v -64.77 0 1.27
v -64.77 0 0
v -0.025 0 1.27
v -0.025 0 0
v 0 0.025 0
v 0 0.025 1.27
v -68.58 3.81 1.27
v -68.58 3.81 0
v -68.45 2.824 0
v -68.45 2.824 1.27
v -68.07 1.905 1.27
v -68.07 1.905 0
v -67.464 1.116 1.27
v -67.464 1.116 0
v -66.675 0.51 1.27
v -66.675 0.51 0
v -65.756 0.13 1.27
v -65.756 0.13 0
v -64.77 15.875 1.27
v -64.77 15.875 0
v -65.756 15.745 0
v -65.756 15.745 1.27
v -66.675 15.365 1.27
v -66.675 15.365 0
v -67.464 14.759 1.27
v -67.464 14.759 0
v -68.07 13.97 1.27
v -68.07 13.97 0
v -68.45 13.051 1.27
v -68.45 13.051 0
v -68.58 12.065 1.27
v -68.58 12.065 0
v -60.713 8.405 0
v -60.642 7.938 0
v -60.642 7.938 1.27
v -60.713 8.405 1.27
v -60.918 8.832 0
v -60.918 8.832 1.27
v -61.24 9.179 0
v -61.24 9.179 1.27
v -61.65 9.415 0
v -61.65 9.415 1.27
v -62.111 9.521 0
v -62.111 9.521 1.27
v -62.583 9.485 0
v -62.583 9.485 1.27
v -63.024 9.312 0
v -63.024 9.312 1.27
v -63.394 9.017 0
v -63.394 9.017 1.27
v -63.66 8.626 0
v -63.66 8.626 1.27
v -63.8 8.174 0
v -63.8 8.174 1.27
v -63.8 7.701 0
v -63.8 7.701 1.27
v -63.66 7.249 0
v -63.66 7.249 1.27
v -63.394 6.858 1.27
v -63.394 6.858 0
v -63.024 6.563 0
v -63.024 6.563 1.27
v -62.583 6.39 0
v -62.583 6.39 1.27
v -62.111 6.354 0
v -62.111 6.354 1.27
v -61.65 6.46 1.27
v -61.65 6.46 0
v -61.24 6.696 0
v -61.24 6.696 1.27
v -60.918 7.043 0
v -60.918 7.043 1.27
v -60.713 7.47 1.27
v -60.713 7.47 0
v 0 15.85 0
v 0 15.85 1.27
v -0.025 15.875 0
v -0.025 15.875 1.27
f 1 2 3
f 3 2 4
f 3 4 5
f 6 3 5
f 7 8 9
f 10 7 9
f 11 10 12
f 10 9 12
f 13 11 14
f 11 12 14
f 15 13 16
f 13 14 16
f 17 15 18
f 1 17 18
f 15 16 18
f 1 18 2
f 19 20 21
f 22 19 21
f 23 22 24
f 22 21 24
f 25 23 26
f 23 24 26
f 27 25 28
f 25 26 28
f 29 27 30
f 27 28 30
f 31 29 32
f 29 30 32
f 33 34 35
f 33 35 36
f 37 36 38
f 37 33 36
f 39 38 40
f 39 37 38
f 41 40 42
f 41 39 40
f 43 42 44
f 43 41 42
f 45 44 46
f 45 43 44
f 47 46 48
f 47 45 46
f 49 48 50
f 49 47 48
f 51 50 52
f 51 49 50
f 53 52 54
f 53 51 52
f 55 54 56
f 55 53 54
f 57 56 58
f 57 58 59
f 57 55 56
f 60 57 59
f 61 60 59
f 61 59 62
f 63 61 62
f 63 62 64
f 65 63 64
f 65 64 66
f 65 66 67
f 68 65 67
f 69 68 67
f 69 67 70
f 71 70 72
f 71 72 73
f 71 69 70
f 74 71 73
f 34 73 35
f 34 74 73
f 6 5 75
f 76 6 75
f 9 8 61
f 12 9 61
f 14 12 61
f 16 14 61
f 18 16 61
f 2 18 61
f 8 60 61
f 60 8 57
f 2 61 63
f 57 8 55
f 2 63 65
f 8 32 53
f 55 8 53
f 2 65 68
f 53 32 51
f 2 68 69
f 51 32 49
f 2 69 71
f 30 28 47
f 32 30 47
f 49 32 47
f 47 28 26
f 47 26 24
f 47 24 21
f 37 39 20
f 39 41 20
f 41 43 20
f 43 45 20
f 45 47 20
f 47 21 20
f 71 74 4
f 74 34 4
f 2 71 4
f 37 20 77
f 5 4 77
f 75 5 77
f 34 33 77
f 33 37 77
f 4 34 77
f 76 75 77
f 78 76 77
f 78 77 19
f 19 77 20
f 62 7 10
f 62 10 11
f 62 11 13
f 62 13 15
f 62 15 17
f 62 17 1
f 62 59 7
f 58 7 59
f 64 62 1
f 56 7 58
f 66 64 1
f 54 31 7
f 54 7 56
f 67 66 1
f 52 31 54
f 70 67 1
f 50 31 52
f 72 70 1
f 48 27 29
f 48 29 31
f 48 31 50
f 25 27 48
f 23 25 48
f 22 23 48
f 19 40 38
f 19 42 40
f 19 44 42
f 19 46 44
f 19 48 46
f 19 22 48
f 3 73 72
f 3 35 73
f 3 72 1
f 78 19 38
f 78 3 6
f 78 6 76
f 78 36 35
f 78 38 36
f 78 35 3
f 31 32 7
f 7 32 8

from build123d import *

# Parameters (mm, degrees)
SKETCH1_R      = 1.5875
EXTRUDE1_DEPTH = 1.27


with BuildPart() as part:
    # Sketch1 → Extrude1 (new body)
    with BuildSketch(Plane.XY):
        with BuildLine():
            Line((0, 15.8496), (-0.0254, 15.875))
            Line((-0.0254, 15.875), (-64.77, 15.875))
            ThreePointArc((-64.77, 15.875), (-67.464076836, 14.759076836), (-68.58, 12.065))
            Line((-68.58, 12.065), (-68.58, 3.81))
            ThreePointArc((-68.58, 3.81), (-67.464076836, 1.115923164), (-64.77, 0))
            Line((-64.77, 0), (-0.0254, 0))
            Line((-0.0254, 0), (0, 0.0254))
            Line((0, 0.0254), (0, 15.8496))
        make_face()
        with Locations((-62.23, 7.9375)):
            Circle(SKETCH1_R, mode=Mode.SUBTRACT)
    extrude(amount=EXTRUDE1_DEPTH)


solid = part.part
